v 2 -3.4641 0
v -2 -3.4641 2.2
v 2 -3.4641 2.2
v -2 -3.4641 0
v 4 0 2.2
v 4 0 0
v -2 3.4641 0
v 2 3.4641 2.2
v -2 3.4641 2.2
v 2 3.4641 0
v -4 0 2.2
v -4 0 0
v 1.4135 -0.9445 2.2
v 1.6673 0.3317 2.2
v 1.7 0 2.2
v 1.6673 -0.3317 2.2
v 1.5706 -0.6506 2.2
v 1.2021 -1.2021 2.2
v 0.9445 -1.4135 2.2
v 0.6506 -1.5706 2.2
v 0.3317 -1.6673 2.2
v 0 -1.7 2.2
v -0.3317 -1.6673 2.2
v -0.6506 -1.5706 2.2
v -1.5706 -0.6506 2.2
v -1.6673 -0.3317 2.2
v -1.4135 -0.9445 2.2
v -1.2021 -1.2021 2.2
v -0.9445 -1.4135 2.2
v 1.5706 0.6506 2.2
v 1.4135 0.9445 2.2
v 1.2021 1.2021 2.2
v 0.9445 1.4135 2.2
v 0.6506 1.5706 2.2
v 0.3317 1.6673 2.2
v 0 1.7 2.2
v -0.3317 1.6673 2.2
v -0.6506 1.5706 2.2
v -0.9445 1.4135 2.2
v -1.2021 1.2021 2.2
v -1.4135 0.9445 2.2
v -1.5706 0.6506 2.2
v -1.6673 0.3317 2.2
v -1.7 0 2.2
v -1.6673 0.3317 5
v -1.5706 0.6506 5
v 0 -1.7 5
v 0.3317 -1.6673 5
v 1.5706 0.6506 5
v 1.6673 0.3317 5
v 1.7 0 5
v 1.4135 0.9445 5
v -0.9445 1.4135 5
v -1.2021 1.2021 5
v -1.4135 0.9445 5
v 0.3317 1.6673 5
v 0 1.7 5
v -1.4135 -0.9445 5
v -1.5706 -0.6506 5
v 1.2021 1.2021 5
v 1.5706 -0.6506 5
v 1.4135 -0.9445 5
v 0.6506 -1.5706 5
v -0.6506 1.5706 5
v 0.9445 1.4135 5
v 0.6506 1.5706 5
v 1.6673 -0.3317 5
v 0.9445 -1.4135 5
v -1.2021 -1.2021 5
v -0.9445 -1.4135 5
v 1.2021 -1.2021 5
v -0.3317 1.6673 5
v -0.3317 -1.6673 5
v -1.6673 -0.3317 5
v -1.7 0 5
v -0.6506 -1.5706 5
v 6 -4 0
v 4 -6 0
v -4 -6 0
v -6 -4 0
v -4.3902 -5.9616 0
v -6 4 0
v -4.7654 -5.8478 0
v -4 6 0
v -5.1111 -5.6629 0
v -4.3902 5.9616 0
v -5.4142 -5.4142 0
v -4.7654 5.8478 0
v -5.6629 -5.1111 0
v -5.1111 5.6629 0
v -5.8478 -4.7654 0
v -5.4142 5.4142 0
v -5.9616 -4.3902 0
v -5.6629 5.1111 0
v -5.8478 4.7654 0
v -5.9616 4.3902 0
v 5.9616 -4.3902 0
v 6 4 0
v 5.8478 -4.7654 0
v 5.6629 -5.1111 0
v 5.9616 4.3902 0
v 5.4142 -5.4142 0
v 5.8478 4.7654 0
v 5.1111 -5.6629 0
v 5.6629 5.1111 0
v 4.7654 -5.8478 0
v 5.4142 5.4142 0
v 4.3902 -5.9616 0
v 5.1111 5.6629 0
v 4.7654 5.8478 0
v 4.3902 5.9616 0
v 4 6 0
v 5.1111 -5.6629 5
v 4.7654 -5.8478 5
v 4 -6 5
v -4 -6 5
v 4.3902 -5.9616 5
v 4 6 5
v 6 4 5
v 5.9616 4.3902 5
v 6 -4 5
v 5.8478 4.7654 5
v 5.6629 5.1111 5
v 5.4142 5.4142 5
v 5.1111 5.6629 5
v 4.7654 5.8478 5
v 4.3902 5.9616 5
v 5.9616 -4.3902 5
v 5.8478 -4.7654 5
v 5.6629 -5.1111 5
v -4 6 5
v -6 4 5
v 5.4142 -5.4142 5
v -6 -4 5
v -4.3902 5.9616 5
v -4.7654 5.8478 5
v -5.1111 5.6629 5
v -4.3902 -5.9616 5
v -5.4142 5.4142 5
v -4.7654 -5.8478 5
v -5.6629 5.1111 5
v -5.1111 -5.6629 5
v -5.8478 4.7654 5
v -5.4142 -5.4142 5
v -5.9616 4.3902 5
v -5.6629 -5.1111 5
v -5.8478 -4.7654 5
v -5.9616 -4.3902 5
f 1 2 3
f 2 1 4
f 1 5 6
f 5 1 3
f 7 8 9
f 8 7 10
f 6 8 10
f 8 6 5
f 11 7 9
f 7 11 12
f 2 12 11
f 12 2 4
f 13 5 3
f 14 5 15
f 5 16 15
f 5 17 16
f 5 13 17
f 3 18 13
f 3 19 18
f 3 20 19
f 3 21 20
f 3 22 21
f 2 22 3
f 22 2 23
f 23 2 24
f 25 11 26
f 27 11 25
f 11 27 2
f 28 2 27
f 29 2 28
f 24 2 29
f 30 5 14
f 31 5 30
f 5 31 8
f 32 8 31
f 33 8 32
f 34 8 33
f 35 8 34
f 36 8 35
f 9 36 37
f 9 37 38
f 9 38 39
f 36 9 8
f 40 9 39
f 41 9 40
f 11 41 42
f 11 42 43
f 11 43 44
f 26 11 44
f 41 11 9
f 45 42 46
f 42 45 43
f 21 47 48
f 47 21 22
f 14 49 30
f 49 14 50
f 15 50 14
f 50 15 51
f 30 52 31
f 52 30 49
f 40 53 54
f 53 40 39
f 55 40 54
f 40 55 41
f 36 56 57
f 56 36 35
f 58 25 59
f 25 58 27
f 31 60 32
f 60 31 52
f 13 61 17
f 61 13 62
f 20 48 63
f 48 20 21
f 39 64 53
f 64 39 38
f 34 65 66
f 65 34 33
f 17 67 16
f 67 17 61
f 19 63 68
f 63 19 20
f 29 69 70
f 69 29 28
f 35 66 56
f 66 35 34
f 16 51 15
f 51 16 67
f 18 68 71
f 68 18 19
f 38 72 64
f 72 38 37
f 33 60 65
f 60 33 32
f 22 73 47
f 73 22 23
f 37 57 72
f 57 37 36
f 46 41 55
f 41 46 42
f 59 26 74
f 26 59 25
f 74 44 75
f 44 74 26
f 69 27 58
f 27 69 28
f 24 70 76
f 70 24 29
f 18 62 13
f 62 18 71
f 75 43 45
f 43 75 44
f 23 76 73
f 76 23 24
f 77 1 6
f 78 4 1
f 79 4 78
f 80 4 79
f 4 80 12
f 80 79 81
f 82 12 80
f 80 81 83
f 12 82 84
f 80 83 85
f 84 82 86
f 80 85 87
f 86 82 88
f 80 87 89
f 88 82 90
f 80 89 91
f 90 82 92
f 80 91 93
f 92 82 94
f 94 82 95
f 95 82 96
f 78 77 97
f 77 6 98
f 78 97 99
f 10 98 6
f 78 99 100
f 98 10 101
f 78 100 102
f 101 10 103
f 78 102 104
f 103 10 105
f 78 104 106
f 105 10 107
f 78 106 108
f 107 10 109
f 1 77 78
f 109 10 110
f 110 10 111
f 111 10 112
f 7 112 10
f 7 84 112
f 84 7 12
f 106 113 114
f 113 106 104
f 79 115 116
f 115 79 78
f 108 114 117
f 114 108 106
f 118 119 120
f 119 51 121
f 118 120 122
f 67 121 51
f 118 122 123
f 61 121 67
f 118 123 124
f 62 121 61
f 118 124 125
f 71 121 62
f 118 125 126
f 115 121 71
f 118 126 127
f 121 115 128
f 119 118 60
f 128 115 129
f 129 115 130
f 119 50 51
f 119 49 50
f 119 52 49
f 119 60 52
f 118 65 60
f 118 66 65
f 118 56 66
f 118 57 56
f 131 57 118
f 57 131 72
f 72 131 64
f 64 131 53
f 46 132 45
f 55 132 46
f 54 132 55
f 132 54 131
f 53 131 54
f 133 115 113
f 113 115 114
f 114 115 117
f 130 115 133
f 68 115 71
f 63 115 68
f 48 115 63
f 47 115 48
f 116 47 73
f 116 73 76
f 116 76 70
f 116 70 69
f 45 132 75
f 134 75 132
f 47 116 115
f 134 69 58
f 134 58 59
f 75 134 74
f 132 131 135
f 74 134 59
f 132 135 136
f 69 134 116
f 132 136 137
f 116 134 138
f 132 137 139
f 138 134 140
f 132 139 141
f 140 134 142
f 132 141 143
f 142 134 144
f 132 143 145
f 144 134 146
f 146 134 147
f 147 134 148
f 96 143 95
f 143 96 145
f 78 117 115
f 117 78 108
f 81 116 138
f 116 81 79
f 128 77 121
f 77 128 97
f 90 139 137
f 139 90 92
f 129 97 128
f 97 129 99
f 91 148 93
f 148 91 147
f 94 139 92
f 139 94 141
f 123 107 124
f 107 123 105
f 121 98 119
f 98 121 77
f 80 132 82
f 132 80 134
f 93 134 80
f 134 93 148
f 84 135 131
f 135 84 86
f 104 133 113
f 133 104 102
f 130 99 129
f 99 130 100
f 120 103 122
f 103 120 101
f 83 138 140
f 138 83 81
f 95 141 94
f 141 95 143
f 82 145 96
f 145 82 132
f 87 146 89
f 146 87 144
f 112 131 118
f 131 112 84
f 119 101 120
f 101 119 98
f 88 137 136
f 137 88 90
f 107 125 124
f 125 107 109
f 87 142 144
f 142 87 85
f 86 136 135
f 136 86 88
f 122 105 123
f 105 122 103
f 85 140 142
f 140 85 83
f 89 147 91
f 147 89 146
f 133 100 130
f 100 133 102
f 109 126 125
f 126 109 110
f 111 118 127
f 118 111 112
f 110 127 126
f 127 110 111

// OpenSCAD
// file: ../source/rm_common.scad
// RobotMind: solid, double-sided panels with one blind mounting interface.
// One port does two jobs: press-fit peg (carriers) or bolted joint via an
// M3 brass heat-set insert (links). All dimensions are millimetres.
$fn = 32;

RM_EPS = 0.1;
RM_UNIT = 40;
RM_GRID = 10;
RM_EDGE_MARGIN = RM_GRID/2;
RM_PANEL_T = 8;
RM_CORNER_R = 3;
RM_FIT = 0; // positive is looser; tune in 0.05 mm steps

// One hexagonal blind port. The hexagonal ring accepts a tool-free peg; the
// central bore seats an M3 brass heat-set insert for bolted links.
RM_PORT_OD = 8;       // hexagon corner-to-corner
RM_PORT_DEPTH = 2.2;  // hex ring depth
RM_INSERT_OD = 4.0;   // brass heat-set insert outer diameter, 4.0 mm
RM_INSERT_BORE = 3.4; // printed blind bore for the insert (melt-press fit)
RM_INSERT_DEPTH = 3.0;// bore depth == insert body length, seats flush
RM_INSERT_PART = "M3x3x4"; // M3 thread, 3 mm body, 4.0 mm OD — owns this seat
RM_PEG_BORE = RM_INSERT_OD+0.2; // peg centre bore clears a seated insert
RM_PEG_ENTRY = 0.2;
RM_PEG_GRIP = 0.2;

RM_M3_CLEARANCE = 3.4;
RM_M3_HEAD_D = 6.2;
RM_M3_HEAD_DEPTH = 2;

// Bolted links. Brackets screw into heat-set inserts seated in panel ports.
RM_LINK_T = 4;   // bracket thickness
RM_LINK_W = 24;  // bracket width across the seam
RM_LINK_ROW = RM_GRID/2;                       // flat rows: 5 mm off the seam
RM_CORNER_ROW = RM_UNIT/2-RM_PANEL_T-RM_EDGE_MARGIN; // 7: fold to first row

function rm_port_od() = RM_PORT_OD+2*RM_FIT;
function rm_insert_bore() = RM_INSERT_BORE+2*RM_FIT;
function rm_peg_root_od(delta=0) = RM_PORT_OD+RM_PEG_GRIP-2*RM_FIT+delta;
function rm_peg_tip_od(delta=0) = RM_PORT_OD-RM_PEG_ENTRY-2*RM_FIT+delta;

function grid_count(span) = floor((span-2*RM_EDGE_MARGIN)/RM_GRID)+1;
function grid_position(i,span) = -span/2+RM_EDGE_MARGIN+i*RM_GRID;
function link_cols(length) =
  [for(k=[0:length/RM_UNIT-1]) RM_GRID/2+2*RM_GRID*k];
function link_hole_xs(length) =
  [for(x=link_cols(length), t=[-1,1]) t*x];

assert(RM_UNIT%RM_GRID == 0, "The unit must contain a whole mounting grid");
assert(grid_count(RM_UNIT) == 4,
       "The 40 mm unit must expose a 4x4 port grid");
assert(RM_PANEL_T-RM_INSERT_DEPTH >= RM_INSERT_DEPTH,
       "Opposed face insert bores must not meet through the membrane");
assert(RM_PANEL_T-RM_INSERT_DEPTH >= 2,
       "Blind insert bore needs a continuous membrane");
assert(RM_INSERT_BORE >= RM_M3_CLEARANCE,
       "Insert bore must clear the M3 shaft");
assert(RM_PEG_BORE > RM_INSERT_OD, "Peg bore must clear a seated insert");
assert(rm_peg_root_od() > rm_port_od() &&
       rm_port_od() > rm_peg_tip_od(),
       "RM_FIT is outside the hexagonal peg range");
assert(RM_GRID-RM_PORT_OD > 1,
       "Mounting ports need enough material between them");
assert(RM_PORT_OD > RM_INSERT_BORE+3,
       "Hex ring needs walls around the insert bore");

module rounded_box(size=[20,20,3], r=2) {
  linear_extrude(height=size[2])
    offset(r=r) offset(delta=-r) square([size[0],size[1]]);
}

module rounded_panel(size=[RM_UNIT,RM_UNIT], t=RM_PANEL_T,
                     r=RM_CORNER_R) {
  translate([-size[0]/2,-size[1]/2,0]) rounded_box([size[0],size[1],t],r);
}

// Cut from a face at Z=0 into material extending in +Z. One blind port:
// hexagonal ring for the press-fit peg, central bore as insert seat.
module blind_port_cut(depth=RM_PORT_DEPTH,
                      bore_d=rm_insert_bore(),
                      bore_depth=RM_INSERT_DEPTH) {
  union() {
    translate([0,0,-RM_EPS])
      cylinder(h=depth+RM_EPS,d=rm_port_od(),$fn=6);
    translate([0,0,-RM_EPS])
      cylinder(h=bore_depth+RM_EPS,d=bore_d);
  }
}

module face_port_cuts(size=[RM_UNIT,RM_UNIT], top=false) {
  for(ix=[0:grid_count(size[0])-1], iy=[0:grid_count(size[1])-1]) {
    p=[grid_position(ix,size[0]),grid_position(iy,size[1])];
    if(top)
      translate([p[0],p[1],RM_PANEL_T]) mirror([0,0,1]) blind_port_cut();
    else
      translate([p[0],p[1],0]) blind_port_cut();
  }
}

module panel(size=[RM_UNIT,RM_UNIT]) {
  assert(size[0]%RM_UNIT == 0 && size[1]%RM_UNIT == 0,
         "Panel dimensions must be whole 40 mm units");
  difference() {
    rounded_panel(size);
    face_port_cuts(size);
    face_port_cuts(size,true);
  }
}

// Every carrier reuses this exact integral peg: solid hex frustum with a
// centre bore that clears a seated insert and passes an M3 screw.
module mount_peg(delta=0, h=RM_PORT_DEPTH) {
  difference() {
    cylinder(h=h,
             d1=rm_peg_root_od(delta),d2=rm_peg_tip_od(delta),$fn=6);
    translate([0,0,-RM_EPS])
      cylinder(h=h+2*RM_EPS,d=RM_PEG_BORE);
  }
}

// Cut from an exposed surface at Z=0 into material extending in +Z.
module optional_screw_cut(depth=RM_PANEL_T) {
  translate([0,0,-RM_EPS])
    cylinder(h=depth+2*RM_EPS,d=RM_M3_CLEARANCE);
  translate([0,0,-RM_EPS])
    cylinder(h=RM_M3_HEAD_DEPTH+RM_EPS,d=RM_M3_HEAD_D);
}

// Bolted links. Both print flat, features up, support-free; screw heads sit
// proud of the bracket (no counterbore). Rows land on the seam-adjacent port
// rows; columns repeat every 20 mm along the seam.

// One M3 pass-through hole: shaft clearance, drilled right through a 4 mm
// bracket in +Z, or in +Y for the fold leg of an angle link.
module link_bolt_hole(x, y, up=true) {
  if(up) translate([x,y,-RM_EPS])
    cylinder(h=RM_LINK_T+2*RM_EPS,d=RM_M3_CLEARANCE);
  else translate([x,y,0]) rotate([90,0,0])
    cylinder(h=RM_LINK_T+2*RM_EPS,d=RM_M3_CLEARANCE);
}

// flat_link(length): bridges a coplanar seam. Holes at +/-5 mm off the
// seam line (the two seam-adjacent port rows of each panel).
module flat_link(length=RM_UNIT) {
  assert(length%RM_UNIT == 0, "Link length must use 40 mm units");
  difference() {
    translate([-length/2,-RM_LINK_W/2,0])
      rounded_box([length,RM_LINK_W,RM_LINK_T],3);
    for(x=link_hole_xs(length), y=[-RM_LINK_ROW,RM_LINK_ROW])
      link_bolt_hole(x,y);
  }
}

// angle_link(length): a 90-degree bracket for box corners. The fold line
// sits at the inner corner; the floor leg extends -Y, the wall leg +Z, so
// holes land on the first two free port rows of each panel.
module angle_link(length=RM_UNIT) {
  assert(length%RM_UNIT == 0, "Link length must use 40 mm units");
  ys=[-RM_CORNER_ROW-RM_GRID, -RM_CORNER_ROW];
  difference() {
    union() {
      translate([-length/2,-RM_LINK_W,0])
        rounded_box([length,RM_LINK_W,RM_LINK_T],3);
      translate([-length/2,-RM_LINK_T,0]) rotate([90,0,0])
        rounded_box([length,RM_LINK_W,RM_LINK_T],3);
    }
    for(x=link_hole_xs(length), y=ys, up=[true,false])
      link_bolt_hole(x,y,up=up);
  }
}
// main file
include <../source/rm_common.scad>

PART="port"; // port, peg_small, peg_nominal or peg_large
assert(PART=="port" || PART=="peg_small" || PART=="peg_nominal" ||
       PART=="peg_large", "Unknown fit-test part");

// Square XY grips: the coupons are hand-held, so both are plain rounded
// slabs at the same grip footprint as a 12 mm circle.
GRIP=12;

module port_coupon() {
  coupon_t=RM_INSERT_DEPTH+2;
  difference() {
    translate([-GRIP/2,-GRIP/2,0]) rounded_box([GRIP,GRIP,coupon_t],2);
    blind_port_cut();
    // full-depth seat so the insert presses through and pushes out for
    // reuse; a real panel keeps the blind bottom, this coupon is for swap
    translate([0,0,-RM_EPS]) cylinder(h=coupon_t+2*RM_EPS,d=RM_INSERT_BORE);
  }
}

// Same integral system as the real carriers, reduced to a coupon: hex
// frustum + a full-depth centre bore so an M3 screw passes all the way
// through the peg and the grip.
module peg_coupon(delta=0) {
  base=3.2;
  difference() {
    union() {
      translate([-GRIP/2,-GRIP/2,0]) rounded_box([GRIP,GRIP,base+0.2],2);
      translate([0,0,base]) mount_peg(delta);
    }
    translate([0,0,-RM_EPS])
      cylinder(h=base+RM_PORT_DEPTH+2*RM_EPS,d=RM_PEG_BORE);
  }
}

if(PART=="port") port_coupon();
if(PART=="peg_small") peg_coupon(-0.1);
if(PART=="peg_nominal") peg_coupon();
if(PART=="peg_large") peg_coupon(0.1);
